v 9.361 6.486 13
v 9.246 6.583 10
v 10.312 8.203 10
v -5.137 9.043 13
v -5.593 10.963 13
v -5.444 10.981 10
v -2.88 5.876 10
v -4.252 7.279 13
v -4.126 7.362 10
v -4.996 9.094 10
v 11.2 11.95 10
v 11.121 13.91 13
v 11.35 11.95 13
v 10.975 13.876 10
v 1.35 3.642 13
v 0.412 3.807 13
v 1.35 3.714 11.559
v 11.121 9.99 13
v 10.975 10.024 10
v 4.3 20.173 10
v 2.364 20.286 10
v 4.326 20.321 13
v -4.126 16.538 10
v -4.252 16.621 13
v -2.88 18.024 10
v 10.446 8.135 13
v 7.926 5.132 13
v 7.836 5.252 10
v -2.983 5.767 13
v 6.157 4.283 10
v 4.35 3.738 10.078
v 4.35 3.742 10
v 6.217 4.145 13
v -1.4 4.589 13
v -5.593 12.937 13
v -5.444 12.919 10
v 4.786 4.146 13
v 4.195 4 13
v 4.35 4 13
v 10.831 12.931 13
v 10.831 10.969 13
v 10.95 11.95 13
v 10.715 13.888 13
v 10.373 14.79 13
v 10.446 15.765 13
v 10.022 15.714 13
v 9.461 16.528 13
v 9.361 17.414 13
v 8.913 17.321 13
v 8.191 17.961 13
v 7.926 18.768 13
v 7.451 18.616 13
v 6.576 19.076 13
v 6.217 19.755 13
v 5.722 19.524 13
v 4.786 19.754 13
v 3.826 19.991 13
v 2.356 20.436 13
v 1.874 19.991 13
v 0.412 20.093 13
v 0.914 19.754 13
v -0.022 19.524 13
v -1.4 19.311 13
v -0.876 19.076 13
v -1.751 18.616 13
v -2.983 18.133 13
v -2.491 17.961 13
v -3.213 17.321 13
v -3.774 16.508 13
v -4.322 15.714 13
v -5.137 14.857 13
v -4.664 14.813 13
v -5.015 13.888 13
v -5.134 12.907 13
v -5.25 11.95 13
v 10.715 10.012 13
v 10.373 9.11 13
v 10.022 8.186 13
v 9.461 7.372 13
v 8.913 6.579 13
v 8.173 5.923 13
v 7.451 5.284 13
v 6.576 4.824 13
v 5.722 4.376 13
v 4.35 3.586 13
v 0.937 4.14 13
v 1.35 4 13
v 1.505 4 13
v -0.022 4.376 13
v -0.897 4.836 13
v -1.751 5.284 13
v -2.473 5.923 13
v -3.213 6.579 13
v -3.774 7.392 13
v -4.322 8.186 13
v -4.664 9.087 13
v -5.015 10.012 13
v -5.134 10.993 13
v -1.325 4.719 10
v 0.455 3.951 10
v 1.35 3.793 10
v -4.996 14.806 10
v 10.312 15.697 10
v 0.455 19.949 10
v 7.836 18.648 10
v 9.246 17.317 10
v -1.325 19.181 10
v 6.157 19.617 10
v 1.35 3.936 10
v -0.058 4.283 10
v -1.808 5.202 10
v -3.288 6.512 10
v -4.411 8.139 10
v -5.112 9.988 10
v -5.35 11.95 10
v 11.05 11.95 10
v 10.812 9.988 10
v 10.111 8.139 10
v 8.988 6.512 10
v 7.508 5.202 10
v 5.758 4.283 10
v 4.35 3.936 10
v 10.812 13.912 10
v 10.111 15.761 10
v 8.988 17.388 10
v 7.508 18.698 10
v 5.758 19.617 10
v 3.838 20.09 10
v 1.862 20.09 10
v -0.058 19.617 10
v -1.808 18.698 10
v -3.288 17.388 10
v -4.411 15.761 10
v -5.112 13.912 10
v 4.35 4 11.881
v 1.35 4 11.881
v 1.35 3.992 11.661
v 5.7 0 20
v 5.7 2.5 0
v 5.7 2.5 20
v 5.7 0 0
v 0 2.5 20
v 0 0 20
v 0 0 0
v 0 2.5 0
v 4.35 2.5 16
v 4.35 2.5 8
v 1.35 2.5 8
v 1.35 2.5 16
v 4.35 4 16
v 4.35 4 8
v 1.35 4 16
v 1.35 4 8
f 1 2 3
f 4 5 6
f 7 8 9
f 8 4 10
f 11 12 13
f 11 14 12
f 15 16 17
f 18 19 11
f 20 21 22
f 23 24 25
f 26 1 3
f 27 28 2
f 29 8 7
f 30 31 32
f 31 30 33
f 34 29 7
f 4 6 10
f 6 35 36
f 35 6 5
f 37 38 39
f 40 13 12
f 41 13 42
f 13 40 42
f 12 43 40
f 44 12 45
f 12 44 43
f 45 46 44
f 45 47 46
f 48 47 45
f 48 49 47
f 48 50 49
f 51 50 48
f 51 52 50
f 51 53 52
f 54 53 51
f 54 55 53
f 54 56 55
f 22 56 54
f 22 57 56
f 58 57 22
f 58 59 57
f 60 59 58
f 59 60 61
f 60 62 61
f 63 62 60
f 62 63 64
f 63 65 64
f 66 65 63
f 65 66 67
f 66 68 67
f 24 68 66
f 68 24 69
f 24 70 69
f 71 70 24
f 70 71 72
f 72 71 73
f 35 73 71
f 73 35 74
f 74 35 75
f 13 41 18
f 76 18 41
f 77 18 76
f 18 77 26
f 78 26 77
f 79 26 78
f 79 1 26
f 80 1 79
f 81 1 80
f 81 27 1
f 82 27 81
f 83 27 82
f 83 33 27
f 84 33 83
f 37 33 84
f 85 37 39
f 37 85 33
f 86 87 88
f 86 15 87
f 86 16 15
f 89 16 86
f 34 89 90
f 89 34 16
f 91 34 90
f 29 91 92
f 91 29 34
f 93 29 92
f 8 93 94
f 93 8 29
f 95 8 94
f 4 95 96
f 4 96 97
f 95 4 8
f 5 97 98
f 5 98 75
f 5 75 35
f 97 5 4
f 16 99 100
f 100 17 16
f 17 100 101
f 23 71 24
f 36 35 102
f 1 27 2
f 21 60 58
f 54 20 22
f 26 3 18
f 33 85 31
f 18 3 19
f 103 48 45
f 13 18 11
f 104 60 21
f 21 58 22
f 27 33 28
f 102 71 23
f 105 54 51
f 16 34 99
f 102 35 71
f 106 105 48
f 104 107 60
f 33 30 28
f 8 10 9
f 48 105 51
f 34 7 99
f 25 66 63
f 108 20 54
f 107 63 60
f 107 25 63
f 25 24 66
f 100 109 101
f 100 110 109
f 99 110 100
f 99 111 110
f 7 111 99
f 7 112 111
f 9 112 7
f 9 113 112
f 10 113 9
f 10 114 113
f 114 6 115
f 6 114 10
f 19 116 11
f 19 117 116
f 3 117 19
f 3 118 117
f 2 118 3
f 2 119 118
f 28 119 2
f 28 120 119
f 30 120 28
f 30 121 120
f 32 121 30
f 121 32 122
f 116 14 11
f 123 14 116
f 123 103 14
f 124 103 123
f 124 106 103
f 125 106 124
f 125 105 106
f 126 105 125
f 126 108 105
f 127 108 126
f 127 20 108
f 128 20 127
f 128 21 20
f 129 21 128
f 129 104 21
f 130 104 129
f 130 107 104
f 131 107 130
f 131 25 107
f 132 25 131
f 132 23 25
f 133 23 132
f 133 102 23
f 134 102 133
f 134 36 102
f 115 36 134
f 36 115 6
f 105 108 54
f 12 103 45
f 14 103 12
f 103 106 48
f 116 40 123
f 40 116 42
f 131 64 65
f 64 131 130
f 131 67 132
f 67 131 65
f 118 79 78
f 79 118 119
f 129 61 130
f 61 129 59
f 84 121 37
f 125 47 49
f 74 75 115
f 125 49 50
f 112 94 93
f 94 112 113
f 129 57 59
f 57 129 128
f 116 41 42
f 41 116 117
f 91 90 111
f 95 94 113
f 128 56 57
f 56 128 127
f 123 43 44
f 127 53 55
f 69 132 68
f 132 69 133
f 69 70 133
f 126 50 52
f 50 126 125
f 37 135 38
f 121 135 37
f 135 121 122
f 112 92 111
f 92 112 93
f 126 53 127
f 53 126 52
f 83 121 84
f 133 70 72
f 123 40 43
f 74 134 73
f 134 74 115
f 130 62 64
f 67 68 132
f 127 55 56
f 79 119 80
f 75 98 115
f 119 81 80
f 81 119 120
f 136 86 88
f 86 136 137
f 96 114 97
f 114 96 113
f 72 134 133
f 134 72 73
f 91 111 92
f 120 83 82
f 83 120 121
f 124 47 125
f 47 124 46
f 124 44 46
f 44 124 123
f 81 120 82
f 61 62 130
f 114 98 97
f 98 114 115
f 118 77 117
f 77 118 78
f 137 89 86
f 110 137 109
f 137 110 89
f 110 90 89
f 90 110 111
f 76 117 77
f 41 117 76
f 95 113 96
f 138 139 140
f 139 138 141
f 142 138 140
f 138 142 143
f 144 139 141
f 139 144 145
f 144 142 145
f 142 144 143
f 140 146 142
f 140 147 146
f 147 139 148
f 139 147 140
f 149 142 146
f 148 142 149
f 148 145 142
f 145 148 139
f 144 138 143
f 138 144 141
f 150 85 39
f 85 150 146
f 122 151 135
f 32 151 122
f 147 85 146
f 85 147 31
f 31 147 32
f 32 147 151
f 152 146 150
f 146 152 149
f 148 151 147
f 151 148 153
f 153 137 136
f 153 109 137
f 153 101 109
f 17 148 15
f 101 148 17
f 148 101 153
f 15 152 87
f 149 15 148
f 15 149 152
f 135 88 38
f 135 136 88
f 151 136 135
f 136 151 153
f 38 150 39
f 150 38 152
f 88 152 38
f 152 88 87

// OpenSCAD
//length of cross section in makerbeam
mb_inner_w = 5.7;
//width of entrance to cross of maker beam
mb_ent_w = 3;
//depth of cross section in maker beam
mb_cross_d =2.5;

//start with rectangle for inner width
cube([mb_inner_w, mb_cross_d, 20]);

//ok now need rectangle coming out out the maker beam, but need to translate it
translate([(mb_inner_w-mb_ent_w)/2,mb_cross_d,8])
{cube([mb_ent_w, 1.5, 8]);
}

//next need empty circle/cylinder that will hold the test tube as a snug fit
//need to translate it to beyond the second cylinder as well
difference(){
translate([mb_inner_w/2,mb_cross_d+1.2+16.5/2,10])
{cylinder(h=3, d1=16.7, d2=17, center = false);
}
translate([mb_inner_w/2,mb_cross_d+1.2+16.5/2,10])
{cylinder(h=6, d1=16.4, d2=16, cantre=false);}
}
